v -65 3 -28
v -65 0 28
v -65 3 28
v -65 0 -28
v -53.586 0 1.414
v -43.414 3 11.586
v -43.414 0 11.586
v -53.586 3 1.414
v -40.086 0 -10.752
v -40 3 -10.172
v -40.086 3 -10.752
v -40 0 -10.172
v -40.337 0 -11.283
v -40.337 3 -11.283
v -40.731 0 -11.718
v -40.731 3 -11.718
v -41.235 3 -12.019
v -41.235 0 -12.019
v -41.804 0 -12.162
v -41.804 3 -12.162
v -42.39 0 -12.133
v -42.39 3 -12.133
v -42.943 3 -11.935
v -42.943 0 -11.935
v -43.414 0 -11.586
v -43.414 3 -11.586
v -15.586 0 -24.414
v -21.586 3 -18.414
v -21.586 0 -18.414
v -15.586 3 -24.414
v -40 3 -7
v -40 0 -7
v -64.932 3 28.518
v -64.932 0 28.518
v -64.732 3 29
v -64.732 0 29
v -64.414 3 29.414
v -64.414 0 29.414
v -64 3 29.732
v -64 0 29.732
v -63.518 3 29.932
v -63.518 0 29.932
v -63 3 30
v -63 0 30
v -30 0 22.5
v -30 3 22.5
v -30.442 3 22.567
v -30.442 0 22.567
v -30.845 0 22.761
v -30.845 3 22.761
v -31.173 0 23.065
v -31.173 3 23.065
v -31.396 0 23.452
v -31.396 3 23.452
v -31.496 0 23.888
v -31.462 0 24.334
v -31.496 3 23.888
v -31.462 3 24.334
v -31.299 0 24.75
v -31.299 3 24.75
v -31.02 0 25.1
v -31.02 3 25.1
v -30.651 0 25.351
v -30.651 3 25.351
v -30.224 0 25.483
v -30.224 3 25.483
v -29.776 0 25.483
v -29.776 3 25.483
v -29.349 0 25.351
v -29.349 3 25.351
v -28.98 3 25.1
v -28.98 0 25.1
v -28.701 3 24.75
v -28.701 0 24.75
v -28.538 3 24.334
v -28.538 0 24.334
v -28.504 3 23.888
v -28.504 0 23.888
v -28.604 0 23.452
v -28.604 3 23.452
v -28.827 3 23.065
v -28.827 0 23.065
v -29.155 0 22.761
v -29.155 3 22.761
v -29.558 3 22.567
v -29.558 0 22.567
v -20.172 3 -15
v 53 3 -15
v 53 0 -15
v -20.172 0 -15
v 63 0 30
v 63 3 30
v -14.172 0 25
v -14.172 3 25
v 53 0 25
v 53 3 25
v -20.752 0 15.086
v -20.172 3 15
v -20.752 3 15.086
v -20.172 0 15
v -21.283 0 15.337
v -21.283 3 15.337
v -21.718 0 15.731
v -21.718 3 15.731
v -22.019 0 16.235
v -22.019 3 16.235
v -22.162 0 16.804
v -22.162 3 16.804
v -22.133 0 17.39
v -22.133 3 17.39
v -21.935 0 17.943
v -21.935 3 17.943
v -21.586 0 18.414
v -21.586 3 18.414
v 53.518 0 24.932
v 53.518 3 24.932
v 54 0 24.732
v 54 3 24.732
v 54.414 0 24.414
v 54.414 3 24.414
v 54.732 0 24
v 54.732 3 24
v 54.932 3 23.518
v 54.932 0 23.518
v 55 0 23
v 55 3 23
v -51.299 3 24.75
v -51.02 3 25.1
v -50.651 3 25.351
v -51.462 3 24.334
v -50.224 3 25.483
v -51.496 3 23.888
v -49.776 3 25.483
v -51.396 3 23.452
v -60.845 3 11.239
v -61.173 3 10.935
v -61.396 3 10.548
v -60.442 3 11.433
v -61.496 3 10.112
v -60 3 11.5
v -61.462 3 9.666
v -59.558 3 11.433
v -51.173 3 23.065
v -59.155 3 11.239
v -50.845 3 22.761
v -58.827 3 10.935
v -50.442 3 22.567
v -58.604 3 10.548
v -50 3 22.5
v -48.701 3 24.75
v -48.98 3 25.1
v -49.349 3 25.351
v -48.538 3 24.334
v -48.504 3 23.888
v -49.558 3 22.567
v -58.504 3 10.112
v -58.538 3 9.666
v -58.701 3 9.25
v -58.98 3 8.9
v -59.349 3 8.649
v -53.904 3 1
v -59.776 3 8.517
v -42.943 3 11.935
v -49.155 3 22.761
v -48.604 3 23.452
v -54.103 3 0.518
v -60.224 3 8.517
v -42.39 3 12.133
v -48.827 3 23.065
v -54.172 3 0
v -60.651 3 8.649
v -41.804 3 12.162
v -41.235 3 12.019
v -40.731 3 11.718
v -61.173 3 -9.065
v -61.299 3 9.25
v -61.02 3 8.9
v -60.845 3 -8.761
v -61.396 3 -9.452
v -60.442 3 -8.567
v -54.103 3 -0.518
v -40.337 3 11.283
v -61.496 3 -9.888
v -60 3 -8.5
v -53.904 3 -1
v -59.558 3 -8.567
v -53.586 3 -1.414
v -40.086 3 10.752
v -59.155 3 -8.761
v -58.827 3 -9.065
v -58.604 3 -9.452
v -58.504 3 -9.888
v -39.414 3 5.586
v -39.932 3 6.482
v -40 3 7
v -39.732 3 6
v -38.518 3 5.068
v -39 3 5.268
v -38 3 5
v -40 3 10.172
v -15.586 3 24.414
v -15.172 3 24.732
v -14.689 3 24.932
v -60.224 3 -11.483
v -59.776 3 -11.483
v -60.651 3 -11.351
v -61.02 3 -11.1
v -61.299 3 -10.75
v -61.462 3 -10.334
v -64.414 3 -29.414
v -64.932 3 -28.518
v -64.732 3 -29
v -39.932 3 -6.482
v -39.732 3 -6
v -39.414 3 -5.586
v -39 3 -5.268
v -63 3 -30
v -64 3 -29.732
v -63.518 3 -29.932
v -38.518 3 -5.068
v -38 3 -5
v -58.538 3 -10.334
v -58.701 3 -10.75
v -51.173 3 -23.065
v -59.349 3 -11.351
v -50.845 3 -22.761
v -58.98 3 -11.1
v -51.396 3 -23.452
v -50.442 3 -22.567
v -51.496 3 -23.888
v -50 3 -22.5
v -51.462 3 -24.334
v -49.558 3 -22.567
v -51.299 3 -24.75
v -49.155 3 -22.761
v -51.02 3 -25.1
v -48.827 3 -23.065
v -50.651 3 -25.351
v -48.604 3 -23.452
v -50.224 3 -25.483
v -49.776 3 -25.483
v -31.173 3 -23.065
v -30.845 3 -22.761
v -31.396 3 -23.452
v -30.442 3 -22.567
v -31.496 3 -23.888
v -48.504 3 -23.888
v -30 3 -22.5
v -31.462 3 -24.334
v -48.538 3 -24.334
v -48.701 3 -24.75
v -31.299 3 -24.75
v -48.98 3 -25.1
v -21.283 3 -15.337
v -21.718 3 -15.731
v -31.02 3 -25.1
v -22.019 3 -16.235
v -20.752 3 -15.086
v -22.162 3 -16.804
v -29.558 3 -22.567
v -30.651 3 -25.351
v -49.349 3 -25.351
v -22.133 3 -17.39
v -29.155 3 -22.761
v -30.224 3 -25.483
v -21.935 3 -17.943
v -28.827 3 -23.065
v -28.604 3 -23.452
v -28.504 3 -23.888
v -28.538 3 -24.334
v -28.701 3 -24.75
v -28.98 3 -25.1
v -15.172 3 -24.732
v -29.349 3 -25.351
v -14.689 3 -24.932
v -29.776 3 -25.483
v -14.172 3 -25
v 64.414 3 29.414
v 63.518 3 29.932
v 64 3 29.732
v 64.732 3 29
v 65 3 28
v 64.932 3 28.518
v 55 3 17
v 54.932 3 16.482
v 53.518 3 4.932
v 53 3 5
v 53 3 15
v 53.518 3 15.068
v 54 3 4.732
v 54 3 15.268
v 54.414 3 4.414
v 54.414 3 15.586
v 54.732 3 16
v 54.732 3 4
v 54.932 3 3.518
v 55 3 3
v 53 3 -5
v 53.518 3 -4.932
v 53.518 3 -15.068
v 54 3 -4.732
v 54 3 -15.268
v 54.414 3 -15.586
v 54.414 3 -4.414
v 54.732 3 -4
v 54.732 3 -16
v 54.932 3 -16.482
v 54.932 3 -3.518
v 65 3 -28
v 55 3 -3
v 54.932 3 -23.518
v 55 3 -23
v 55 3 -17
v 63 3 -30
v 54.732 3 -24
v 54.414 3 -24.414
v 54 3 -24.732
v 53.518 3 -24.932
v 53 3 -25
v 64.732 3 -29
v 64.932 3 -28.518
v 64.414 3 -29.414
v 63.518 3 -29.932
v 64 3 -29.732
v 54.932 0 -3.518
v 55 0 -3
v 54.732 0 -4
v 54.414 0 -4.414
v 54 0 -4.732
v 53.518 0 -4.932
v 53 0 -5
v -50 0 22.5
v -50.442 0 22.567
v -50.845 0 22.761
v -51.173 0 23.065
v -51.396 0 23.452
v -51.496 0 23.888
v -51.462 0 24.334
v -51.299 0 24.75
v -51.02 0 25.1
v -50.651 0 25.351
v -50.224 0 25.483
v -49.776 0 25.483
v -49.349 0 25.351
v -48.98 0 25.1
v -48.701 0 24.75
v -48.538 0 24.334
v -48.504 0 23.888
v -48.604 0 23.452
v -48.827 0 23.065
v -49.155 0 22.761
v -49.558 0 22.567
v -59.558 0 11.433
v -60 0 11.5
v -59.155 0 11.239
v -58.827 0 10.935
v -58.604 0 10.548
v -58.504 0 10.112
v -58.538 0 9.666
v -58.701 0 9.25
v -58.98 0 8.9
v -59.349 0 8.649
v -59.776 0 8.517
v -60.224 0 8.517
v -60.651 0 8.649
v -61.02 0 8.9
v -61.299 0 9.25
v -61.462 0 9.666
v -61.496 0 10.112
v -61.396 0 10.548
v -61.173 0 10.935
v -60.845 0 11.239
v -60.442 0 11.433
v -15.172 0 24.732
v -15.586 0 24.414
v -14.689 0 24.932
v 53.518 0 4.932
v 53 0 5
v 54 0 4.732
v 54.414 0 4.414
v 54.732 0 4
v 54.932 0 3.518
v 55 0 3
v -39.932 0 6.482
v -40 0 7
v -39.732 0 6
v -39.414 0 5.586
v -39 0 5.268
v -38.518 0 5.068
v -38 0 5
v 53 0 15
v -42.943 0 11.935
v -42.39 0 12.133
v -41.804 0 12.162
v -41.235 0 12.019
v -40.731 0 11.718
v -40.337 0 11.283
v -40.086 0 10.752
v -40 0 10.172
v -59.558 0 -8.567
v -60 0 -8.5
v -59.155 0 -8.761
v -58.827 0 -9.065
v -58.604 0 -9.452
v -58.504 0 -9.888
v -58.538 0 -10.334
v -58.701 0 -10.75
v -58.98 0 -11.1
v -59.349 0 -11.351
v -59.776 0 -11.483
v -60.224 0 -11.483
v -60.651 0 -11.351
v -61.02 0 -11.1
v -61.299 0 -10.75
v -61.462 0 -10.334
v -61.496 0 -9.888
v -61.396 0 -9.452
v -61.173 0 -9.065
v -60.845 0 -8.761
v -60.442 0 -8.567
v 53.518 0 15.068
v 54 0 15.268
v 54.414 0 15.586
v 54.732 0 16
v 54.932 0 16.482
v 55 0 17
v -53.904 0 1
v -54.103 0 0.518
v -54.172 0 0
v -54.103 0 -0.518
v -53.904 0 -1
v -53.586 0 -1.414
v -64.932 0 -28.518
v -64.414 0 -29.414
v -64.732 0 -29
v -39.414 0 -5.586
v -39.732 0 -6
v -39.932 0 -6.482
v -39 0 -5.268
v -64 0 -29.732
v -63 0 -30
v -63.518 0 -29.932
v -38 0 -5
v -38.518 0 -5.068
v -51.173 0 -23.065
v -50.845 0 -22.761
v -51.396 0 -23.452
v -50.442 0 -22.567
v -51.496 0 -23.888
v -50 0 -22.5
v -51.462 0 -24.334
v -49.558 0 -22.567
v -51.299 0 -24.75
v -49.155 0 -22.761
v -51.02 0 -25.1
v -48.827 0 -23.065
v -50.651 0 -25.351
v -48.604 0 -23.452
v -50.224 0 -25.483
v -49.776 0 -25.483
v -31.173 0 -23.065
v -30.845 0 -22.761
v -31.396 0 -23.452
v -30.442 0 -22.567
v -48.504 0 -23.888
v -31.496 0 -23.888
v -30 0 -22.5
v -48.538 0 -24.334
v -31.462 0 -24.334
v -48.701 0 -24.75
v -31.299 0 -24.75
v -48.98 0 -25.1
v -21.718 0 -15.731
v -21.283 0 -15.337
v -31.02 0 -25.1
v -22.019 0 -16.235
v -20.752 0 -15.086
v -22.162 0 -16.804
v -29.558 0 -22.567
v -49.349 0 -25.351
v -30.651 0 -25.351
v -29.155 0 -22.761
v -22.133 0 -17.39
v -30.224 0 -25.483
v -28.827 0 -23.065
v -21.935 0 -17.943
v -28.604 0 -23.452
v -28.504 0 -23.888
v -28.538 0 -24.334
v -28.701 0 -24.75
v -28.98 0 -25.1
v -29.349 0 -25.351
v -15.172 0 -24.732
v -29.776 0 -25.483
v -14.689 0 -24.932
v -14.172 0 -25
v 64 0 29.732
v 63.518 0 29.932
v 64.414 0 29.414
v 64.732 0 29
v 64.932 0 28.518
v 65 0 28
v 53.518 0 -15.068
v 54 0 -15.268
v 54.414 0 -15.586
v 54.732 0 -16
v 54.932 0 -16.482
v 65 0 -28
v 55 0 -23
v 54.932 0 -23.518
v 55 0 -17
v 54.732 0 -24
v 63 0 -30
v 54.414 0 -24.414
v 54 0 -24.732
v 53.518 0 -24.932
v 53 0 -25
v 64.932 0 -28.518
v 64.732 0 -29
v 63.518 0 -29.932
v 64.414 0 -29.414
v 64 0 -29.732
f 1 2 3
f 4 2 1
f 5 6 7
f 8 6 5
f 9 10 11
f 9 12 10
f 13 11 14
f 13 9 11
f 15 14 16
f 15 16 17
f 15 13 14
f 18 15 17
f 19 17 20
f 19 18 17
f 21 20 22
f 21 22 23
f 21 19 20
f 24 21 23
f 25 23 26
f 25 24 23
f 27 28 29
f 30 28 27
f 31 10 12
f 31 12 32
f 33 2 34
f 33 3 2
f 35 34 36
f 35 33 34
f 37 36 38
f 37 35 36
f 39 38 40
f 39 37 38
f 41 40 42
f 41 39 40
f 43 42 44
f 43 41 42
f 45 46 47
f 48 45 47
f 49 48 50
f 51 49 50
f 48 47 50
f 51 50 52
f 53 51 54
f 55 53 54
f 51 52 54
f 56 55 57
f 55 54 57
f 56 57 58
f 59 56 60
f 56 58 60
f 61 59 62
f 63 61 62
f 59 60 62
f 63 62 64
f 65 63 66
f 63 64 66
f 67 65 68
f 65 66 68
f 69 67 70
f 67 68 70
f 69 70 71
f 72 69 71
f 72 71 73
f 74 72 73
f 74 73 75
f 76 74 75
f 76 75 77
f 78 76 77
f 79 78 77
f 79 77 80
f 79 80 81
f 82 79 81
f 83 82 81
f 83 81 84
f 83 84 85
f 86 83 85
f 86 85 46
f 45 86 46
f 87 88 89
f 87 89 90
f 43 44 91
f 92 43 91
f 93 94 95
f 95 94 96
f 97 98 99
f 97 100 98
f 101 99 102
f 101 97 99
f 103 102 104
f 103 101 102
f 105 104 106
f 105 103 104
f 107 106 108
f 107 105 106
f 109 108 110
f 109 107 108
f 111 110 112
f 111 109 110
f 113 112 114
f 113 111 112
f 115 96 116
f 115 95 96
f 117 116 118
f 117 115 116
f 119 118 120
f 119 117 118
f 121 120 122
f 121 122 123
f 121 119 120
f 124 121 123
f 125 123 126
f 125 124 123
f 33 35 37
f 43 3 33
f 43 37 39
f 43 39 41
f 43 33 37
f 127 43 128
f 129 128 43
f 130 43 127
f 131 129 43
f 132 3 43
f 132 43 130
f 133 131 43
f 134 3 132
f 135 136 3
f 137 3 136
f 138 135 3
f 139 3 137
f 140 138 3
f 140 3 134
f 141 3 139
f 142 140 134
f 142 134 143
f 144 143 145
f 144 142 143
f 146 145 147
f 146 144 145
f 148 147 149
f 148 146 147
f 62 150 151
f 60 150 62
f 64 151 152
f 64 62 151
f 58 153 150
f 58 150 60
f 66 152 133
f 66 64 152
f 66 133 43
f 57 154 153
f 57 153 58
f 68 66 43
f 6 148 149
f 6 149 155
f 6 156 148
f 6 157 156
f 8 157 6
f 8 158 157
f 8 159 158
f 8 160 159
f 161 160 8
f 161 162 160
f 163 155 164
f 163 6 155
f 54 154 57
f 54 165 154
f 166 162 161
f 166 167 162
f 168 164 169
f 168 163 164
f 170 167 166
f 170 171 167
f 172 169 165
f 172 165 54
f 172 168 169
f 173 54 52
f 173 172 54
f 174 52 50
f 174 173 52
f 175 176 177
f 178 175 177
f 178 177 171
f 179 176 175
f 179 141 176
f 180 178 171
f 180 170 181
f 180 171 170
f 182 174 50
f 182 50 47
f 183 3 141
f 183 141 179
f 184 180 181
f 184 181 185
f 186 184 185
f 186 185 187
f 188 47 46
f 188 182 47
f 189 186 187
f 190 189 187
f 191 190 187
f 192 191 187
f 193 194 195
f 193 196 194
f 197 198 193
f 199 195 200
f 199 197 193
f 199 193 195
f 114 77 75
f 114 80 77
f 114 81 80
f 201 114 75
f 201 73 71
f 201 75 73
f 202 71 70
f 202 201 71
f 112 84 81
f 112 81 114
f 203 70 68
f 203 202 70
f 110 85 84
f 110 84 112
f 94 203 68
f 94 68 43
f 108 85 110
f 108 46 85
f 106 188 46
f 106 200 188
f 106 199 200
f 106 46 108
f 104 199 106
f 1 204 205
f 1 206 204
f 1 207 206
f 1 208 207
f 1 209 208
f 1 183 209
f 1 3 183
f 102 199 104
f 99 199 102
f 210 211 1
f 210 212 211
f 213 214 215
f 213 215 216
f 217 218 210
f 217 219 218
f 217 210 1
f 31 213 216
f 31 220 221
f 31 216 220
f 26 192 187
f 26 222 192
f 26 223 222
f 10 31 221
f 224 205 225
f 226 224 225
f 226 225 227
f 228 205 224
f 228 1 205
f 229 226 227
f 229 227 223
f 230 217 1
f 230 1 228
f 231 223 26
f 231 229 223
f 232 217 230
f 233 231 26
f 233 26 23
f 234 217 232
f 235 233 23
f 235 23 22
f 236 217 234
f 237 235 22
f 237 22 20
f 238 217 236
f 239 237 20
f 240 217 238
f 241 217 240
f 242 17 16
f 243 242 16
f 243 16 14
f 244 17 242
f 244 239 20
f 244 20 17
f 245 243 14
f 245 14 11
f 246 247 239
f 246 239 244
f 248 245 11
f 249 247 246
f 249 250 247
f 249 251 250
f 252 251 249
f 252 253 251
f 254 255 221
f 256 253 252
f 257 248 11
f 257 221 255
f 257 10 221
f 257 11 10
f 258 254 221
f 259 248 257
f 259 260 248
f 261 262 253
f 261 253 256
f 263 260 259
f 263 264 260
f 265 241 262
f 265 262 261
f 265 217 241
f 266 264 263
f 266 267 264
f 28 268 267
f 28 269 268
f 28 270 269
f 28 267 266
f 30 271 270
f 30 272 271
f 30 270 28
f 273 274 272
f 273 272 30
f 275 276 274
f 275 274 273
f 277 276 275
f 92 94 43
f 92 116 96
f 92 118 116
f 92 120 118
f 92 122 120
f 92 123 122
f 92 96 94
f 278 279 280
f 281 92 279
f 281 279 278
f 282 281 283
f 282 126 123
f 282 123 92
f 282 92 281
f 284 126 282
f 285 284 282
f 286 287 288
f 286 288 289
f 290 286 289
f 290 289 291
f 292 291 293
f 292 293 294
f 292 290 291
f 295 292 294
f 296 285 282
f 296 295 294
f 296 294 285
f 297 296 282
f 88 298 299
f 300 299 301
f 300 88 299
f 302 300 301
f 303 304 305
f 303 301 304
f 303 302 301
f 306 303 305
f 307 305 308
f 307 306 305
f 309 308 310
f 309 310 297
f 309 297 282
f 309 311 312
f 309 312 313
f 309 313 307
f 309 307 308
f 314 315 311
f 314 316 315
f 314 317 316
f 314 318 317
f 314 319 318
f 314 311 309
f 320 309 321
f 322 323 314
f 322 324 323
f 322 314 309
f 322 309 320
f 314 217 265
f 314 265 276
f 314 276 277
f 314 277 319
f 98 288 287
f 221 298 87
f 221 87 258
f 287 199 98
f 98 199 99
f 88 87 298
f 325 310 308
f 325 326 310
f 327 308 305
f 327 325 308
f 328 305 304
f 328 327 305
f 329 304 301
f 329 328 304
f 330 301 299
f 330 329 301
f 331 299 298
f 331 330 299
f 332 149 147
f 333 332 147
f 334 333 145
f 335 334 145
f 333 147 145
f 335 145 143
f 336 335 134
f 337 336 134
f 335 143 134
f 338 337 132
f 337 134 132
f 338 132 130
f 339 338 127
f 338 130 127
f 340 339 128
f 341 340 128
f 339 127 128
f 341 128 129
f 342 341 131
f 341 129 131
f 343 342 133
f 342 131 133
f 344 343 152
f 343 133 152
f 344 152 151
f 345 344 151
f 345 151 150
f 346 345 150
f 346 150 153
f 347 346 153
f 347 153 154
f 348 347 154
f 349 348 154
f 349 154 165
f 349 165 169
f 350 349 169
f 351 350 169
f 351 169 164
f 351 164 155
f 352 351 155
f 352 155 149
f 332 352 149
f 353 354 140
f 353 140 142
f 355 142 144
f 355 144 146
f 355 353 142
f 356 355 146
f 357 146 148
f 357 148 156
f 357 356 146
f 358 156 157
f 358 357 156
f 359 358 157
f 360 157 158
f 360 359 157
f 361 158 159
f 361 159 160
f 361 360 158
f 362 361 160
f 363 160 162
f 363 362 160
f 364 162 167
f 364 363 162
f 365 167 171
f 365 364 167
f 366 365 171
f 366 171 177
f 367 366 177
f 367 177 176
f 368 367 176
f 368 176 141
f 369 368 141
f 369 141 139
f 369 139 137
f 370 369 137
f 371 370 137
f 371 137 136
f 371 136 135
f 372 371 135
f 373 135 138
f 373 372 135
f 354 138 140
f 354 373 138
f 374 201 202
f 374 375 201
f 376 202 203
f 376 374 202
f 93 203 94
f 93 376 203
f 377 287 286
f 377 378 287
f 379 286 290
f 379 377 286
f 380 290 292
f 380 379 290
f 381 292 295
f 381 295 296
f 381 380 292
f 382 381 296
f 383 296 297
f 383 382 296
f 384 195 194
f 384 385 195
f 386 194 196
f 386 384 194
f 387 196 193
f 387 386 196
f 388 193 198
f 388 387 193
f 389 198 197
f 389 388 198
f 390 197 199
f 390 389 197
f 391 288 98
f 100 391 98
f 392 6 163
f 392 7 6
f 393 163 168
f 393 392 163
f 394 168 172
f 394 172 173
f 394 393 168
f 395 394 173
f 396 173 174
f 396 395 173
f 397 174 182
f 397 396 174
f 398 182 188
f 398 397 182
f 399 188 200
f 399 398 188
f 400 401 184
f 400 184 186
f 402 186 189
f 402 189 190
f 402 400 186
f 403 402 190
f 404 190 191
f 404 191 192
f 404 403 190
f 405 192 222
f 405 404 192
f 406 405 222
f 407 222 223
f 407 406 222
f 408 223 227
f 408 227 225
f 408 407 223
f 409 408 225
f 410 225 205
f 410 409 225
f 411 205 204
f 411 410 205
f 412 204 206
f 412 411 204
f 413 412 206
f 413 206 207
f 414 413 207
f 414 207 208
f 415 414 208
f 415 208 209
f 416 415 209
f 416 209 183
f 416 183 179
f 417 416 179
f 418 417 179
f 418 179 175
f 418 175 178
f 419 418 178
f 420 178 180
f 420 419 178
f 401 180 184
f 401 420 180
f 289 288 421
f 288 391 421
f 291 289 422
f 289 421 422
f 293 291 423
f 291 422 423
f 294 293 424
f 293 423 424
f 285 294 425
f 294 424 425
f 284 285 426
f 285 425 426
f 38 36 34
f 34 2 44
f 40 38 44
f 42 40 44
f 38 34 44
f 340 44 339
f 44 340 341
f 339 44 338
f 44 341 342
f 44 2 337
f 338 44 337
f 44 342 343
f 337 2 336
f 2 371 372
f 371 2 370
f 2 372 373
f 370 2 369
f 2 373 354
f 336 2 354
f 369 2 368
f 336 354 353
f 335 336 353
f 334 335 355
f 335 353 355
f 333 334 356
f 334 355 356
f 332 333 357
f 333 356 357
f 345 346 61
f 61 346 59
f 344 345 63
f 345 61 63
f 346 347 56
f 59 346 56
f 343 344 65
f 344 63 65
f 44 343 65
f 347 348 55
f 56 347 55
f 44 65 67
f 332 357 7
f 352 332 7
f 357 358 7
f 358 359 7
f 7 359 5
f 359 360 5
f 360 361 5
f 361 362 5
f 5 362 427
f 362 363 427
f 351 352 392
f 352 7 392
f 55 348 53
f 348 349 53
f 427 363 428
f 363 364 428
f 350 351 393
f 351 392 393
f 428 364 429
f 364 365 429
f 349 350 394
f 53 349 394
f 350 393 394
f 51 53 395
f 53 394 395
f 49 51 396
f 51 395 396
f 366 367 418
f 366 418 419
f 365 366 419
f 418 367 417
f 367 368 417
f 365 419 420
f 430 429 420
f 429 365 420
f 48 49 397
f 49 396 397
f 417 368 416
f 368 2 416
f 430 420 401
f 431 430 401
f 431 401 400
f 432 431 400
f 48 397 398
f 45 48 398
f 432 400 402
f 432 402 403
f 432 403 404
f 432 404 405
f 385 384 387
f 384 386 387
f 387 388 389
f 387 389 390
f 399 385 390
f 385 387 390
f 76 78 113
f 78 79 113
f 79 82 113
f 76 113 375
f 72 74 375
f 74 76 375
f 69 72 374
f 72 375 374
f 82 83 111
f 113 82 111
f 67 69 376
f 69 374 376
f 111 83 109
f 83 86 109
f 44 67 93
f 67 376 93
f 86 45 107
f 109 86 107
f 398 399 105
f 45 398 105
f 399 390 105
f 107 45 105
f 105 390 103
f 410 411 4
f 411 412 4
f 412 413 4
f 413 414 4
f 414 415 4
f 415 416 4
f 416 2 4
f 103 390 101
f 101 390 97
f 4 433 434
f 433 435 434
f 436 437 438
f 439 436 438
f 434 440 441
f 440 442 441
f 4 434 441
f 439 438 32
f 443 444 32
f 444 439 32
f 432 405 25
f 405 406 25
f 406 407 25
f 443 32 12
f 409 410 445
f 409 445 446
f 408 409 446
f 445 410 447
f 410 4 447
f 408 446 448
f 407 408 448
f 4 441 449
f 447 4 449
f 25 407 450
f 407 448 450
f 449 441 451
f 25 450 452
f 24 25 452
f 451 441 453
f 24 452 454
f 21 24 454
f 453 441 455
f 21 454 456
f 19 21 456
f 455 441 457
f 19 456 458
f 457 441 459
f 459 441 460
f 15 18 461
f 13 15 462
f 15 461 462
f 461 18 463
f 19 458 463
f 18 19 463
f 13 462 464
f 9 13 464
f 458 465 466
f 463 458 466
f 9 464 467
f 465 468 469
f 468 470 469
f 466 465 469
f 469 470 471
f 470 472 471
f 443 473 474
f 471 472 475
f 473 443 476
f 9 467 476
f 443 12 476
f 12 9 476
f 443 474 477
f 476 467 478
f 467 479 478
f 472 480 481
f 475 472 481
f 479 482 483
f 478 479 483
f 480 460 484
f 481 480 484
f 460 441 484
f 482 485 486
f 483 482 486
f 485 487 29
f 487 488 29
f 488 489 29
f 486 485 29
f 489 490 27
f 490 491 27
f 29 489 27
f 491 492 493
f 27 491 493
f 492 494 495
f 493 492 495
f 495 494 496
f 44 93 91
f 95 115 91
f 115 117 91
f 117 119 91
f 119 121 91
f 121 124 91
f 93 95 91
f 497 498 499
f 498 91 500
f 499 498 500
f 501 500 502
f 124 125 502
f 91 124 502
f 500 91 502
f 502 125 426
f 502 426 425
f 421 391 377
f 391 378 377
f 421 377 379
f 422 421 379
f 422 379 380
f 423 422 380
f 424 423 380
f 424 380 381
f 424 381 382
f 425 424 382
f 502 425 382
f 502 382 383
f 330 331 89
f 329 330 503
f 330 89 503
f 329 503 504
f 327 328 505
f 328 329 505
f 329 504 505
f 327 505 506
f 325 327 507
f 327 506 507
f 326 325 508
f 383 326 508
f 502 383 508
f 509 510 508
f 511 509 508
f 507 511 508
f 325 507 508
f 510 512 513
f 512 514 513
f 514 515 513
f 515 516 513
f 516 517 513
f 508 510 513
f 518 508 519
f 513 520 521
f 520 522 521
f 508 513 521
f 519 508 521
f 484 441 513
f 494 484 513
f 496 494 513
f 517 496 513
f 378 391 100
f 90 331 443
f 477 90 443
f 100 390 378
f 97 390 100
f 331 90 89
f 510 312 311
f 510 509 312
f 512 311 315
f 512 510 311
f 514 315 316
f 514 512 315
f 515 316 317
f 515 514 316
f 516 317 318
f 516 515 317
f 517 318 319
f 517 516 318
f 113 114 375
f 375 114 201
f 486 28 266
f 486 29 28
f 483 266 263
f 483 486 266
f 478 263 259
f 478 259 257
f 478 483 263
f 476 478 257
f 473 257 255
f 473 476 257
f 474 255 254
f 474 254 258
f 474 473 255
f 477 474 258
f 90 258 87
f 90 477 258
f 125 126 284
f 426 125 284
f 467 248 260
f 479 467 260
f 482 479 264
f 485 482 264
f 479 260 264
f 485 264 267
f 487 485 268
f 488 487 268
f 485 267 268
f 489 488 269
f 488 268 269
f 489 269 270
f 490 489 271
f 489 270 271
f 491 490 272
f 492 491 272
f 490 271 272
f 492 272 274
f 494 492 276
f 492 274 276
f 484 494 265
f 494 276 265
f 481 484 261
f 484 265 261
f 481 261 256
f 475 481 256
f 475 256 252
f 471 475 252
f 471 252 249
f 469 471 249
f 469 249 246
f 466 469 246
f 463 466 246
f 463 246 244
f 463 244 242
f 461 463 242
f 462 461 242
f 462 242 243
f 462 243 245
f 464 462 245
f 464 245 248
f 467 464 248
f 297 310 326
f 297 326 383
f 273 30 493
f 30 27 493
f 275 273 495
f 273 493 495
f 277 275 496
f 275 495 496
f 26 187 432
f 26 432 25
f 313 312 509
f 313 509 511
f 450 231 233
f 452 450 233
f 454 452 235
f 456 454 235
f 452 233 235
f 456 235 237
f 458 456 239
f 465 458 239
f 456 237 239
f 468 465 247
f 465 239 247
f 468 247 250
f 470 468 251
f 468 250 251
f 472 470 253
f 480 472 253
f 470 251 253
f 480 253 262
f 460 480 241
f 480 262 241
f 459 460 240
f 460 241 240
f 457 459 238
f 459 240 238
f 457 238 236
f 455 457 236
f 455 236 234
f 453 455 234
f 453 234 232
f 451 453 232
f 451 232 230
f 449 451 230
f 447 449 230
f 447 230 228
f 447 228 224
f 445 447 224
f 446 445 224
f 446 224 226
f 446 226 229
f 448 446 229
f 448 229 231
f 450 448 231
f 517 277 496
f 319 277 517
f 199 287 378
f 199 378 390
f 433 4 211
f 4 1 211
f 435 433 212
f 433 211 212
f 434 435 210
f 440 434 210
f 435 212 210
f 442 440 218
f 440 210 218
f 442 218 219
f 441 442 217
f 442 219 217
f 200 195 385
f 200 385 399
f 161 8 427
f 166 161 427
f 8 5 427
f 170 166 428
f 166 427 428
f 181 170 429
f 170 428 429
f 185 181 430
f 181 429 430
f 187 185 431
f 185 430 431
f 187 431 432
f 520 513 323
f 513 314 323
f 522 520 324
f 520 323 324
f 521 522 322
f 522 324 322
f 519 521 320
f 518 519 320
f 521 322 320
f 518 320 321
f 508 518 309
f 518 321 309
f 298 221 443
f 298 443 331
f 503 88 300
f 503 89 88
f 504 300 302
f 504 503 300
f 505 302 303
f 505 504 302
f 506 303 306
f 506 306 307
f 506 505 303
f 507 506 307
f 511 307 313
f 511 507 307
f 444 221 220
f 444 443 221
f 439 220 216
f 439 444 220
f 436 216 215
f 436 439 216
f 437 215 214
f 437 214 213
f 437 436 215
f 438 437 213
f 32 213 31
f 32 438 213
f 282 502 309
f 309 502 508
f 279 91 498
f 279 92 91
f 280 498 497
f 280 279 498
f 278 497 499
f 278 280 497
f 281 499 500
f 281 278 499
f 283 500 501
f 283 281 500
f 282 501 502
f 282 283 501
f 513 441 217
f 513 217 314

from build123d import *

# Parameters (mm, degrees)
SKETCH_1_W          = 130
SKETCH_1_H          = 60
SKETCH_1_R          = 1.5
EXTRUDE_1_DEPTH     = 3
SKETCH_2_R          = 1.5
CUT_EXTRUDE_1_DEPTH = 72.651936471
CUT_EXTRUDE_2_DEPTH = 72.651936471
FILLET_1_R          = 2


with BuildPart() as part:
    # 草图1 → 凸台-拉伸1 (new body)
    with BuildSketch(Plane(origin=(0, 0, 0), x_dir=(1, 0, 0), z_dir=(0, 1, 0))):
        Rectangle(SKETCH_1_W, SKETCH_1_H)
        with Locations(Location((-60, 10, 0), (0, 0, 270))):
            Circle(SKETCH_1_R, mode=Mode.SUBTRACT)
        with Locations(Location((-60, -10, 0), (0, 0, 270))):
            Circle(SKETCH_1_R, mode=Mode.SUBTRACT)
    extrude(amount=EXTRUDE_1_DEPTH)

    # 草图2 → 切除-拉伸1 (cut, through all)
    with BuildSketch(Plane(origin=(0, 3, 0), x_dir=(1, 0, 0), z_dir=(0, 1, 0))):
        with Locations(Location((-30, 24, 0), (0, 0, 270))):
            Circle(SKETCH_2_R)
        with Locations(Location((-50, 24, 0), (0, 0, 270))):
            Circle(SKETCH_2_R)
        with Locations(Location((-50, -24, 0), (0, 0, 90))):
            Circle(SKETCH_2_R)
        with Locations(Location((-30, -24, 0), (0, 0, 90))):
            Circle(SKETCH_2_R)
    extrude(amount=-CUT_EXTRUDE_1_DEPTH, mode=Mode.SUBTRACT)

    # 草图3 → 切除-拉伸2 (cut, through all)
    with BuildSketch(Plane(origin=(0, 3, 0), x_dir=(1, 0, 0), z_dir=(0, 1, 0))):
        Polygon((-55, 0), (-40, 15), (-40, 5), (55, 5), (55, -5), (-40, -5), (-40, -15), align=None)
        Polygon((-15, 25), (55, 25), (55, 15), (-25, 15), align=None)
        Polygon((55, -15), (-25, -15), (-15, -25), (55, -25), align=None)
    extrude(amount=-CUT_EXTRUDE_2_DEPTH, mode=Mode.SUBTRACT)

    # 圆角1
    fillet_1_edges = [part.edges().sort_by_distance(p)[0] for p in [
        (55, 1.5, 15),
        (55, 1.5, 25),
        (-15, 1.5, 25),
        (-25, 1.5, 15),
        (-25, 1.5, -15),
        (-15, 1.5, -25),
        (55, 1.5, -25),
        (55, 1.5, -15),
        (-40, 1.5, 15),
        (-55, 1.5, 0),
        (-40, 1.5, -15),
        (-40, 1.5, -5),
        (55, 1.5, -5),
        (55, 1.5, 5),
        (-40, 1.5, 5),
        (65, 1.5, 30),
        (-65, 1.5, 30),
        (-65, 1.5, -30),
        (65, 1.5, -30),
    ]]
    fillet(fillet_1_edges, radius=FILLET_1_R)


solid = part.part
